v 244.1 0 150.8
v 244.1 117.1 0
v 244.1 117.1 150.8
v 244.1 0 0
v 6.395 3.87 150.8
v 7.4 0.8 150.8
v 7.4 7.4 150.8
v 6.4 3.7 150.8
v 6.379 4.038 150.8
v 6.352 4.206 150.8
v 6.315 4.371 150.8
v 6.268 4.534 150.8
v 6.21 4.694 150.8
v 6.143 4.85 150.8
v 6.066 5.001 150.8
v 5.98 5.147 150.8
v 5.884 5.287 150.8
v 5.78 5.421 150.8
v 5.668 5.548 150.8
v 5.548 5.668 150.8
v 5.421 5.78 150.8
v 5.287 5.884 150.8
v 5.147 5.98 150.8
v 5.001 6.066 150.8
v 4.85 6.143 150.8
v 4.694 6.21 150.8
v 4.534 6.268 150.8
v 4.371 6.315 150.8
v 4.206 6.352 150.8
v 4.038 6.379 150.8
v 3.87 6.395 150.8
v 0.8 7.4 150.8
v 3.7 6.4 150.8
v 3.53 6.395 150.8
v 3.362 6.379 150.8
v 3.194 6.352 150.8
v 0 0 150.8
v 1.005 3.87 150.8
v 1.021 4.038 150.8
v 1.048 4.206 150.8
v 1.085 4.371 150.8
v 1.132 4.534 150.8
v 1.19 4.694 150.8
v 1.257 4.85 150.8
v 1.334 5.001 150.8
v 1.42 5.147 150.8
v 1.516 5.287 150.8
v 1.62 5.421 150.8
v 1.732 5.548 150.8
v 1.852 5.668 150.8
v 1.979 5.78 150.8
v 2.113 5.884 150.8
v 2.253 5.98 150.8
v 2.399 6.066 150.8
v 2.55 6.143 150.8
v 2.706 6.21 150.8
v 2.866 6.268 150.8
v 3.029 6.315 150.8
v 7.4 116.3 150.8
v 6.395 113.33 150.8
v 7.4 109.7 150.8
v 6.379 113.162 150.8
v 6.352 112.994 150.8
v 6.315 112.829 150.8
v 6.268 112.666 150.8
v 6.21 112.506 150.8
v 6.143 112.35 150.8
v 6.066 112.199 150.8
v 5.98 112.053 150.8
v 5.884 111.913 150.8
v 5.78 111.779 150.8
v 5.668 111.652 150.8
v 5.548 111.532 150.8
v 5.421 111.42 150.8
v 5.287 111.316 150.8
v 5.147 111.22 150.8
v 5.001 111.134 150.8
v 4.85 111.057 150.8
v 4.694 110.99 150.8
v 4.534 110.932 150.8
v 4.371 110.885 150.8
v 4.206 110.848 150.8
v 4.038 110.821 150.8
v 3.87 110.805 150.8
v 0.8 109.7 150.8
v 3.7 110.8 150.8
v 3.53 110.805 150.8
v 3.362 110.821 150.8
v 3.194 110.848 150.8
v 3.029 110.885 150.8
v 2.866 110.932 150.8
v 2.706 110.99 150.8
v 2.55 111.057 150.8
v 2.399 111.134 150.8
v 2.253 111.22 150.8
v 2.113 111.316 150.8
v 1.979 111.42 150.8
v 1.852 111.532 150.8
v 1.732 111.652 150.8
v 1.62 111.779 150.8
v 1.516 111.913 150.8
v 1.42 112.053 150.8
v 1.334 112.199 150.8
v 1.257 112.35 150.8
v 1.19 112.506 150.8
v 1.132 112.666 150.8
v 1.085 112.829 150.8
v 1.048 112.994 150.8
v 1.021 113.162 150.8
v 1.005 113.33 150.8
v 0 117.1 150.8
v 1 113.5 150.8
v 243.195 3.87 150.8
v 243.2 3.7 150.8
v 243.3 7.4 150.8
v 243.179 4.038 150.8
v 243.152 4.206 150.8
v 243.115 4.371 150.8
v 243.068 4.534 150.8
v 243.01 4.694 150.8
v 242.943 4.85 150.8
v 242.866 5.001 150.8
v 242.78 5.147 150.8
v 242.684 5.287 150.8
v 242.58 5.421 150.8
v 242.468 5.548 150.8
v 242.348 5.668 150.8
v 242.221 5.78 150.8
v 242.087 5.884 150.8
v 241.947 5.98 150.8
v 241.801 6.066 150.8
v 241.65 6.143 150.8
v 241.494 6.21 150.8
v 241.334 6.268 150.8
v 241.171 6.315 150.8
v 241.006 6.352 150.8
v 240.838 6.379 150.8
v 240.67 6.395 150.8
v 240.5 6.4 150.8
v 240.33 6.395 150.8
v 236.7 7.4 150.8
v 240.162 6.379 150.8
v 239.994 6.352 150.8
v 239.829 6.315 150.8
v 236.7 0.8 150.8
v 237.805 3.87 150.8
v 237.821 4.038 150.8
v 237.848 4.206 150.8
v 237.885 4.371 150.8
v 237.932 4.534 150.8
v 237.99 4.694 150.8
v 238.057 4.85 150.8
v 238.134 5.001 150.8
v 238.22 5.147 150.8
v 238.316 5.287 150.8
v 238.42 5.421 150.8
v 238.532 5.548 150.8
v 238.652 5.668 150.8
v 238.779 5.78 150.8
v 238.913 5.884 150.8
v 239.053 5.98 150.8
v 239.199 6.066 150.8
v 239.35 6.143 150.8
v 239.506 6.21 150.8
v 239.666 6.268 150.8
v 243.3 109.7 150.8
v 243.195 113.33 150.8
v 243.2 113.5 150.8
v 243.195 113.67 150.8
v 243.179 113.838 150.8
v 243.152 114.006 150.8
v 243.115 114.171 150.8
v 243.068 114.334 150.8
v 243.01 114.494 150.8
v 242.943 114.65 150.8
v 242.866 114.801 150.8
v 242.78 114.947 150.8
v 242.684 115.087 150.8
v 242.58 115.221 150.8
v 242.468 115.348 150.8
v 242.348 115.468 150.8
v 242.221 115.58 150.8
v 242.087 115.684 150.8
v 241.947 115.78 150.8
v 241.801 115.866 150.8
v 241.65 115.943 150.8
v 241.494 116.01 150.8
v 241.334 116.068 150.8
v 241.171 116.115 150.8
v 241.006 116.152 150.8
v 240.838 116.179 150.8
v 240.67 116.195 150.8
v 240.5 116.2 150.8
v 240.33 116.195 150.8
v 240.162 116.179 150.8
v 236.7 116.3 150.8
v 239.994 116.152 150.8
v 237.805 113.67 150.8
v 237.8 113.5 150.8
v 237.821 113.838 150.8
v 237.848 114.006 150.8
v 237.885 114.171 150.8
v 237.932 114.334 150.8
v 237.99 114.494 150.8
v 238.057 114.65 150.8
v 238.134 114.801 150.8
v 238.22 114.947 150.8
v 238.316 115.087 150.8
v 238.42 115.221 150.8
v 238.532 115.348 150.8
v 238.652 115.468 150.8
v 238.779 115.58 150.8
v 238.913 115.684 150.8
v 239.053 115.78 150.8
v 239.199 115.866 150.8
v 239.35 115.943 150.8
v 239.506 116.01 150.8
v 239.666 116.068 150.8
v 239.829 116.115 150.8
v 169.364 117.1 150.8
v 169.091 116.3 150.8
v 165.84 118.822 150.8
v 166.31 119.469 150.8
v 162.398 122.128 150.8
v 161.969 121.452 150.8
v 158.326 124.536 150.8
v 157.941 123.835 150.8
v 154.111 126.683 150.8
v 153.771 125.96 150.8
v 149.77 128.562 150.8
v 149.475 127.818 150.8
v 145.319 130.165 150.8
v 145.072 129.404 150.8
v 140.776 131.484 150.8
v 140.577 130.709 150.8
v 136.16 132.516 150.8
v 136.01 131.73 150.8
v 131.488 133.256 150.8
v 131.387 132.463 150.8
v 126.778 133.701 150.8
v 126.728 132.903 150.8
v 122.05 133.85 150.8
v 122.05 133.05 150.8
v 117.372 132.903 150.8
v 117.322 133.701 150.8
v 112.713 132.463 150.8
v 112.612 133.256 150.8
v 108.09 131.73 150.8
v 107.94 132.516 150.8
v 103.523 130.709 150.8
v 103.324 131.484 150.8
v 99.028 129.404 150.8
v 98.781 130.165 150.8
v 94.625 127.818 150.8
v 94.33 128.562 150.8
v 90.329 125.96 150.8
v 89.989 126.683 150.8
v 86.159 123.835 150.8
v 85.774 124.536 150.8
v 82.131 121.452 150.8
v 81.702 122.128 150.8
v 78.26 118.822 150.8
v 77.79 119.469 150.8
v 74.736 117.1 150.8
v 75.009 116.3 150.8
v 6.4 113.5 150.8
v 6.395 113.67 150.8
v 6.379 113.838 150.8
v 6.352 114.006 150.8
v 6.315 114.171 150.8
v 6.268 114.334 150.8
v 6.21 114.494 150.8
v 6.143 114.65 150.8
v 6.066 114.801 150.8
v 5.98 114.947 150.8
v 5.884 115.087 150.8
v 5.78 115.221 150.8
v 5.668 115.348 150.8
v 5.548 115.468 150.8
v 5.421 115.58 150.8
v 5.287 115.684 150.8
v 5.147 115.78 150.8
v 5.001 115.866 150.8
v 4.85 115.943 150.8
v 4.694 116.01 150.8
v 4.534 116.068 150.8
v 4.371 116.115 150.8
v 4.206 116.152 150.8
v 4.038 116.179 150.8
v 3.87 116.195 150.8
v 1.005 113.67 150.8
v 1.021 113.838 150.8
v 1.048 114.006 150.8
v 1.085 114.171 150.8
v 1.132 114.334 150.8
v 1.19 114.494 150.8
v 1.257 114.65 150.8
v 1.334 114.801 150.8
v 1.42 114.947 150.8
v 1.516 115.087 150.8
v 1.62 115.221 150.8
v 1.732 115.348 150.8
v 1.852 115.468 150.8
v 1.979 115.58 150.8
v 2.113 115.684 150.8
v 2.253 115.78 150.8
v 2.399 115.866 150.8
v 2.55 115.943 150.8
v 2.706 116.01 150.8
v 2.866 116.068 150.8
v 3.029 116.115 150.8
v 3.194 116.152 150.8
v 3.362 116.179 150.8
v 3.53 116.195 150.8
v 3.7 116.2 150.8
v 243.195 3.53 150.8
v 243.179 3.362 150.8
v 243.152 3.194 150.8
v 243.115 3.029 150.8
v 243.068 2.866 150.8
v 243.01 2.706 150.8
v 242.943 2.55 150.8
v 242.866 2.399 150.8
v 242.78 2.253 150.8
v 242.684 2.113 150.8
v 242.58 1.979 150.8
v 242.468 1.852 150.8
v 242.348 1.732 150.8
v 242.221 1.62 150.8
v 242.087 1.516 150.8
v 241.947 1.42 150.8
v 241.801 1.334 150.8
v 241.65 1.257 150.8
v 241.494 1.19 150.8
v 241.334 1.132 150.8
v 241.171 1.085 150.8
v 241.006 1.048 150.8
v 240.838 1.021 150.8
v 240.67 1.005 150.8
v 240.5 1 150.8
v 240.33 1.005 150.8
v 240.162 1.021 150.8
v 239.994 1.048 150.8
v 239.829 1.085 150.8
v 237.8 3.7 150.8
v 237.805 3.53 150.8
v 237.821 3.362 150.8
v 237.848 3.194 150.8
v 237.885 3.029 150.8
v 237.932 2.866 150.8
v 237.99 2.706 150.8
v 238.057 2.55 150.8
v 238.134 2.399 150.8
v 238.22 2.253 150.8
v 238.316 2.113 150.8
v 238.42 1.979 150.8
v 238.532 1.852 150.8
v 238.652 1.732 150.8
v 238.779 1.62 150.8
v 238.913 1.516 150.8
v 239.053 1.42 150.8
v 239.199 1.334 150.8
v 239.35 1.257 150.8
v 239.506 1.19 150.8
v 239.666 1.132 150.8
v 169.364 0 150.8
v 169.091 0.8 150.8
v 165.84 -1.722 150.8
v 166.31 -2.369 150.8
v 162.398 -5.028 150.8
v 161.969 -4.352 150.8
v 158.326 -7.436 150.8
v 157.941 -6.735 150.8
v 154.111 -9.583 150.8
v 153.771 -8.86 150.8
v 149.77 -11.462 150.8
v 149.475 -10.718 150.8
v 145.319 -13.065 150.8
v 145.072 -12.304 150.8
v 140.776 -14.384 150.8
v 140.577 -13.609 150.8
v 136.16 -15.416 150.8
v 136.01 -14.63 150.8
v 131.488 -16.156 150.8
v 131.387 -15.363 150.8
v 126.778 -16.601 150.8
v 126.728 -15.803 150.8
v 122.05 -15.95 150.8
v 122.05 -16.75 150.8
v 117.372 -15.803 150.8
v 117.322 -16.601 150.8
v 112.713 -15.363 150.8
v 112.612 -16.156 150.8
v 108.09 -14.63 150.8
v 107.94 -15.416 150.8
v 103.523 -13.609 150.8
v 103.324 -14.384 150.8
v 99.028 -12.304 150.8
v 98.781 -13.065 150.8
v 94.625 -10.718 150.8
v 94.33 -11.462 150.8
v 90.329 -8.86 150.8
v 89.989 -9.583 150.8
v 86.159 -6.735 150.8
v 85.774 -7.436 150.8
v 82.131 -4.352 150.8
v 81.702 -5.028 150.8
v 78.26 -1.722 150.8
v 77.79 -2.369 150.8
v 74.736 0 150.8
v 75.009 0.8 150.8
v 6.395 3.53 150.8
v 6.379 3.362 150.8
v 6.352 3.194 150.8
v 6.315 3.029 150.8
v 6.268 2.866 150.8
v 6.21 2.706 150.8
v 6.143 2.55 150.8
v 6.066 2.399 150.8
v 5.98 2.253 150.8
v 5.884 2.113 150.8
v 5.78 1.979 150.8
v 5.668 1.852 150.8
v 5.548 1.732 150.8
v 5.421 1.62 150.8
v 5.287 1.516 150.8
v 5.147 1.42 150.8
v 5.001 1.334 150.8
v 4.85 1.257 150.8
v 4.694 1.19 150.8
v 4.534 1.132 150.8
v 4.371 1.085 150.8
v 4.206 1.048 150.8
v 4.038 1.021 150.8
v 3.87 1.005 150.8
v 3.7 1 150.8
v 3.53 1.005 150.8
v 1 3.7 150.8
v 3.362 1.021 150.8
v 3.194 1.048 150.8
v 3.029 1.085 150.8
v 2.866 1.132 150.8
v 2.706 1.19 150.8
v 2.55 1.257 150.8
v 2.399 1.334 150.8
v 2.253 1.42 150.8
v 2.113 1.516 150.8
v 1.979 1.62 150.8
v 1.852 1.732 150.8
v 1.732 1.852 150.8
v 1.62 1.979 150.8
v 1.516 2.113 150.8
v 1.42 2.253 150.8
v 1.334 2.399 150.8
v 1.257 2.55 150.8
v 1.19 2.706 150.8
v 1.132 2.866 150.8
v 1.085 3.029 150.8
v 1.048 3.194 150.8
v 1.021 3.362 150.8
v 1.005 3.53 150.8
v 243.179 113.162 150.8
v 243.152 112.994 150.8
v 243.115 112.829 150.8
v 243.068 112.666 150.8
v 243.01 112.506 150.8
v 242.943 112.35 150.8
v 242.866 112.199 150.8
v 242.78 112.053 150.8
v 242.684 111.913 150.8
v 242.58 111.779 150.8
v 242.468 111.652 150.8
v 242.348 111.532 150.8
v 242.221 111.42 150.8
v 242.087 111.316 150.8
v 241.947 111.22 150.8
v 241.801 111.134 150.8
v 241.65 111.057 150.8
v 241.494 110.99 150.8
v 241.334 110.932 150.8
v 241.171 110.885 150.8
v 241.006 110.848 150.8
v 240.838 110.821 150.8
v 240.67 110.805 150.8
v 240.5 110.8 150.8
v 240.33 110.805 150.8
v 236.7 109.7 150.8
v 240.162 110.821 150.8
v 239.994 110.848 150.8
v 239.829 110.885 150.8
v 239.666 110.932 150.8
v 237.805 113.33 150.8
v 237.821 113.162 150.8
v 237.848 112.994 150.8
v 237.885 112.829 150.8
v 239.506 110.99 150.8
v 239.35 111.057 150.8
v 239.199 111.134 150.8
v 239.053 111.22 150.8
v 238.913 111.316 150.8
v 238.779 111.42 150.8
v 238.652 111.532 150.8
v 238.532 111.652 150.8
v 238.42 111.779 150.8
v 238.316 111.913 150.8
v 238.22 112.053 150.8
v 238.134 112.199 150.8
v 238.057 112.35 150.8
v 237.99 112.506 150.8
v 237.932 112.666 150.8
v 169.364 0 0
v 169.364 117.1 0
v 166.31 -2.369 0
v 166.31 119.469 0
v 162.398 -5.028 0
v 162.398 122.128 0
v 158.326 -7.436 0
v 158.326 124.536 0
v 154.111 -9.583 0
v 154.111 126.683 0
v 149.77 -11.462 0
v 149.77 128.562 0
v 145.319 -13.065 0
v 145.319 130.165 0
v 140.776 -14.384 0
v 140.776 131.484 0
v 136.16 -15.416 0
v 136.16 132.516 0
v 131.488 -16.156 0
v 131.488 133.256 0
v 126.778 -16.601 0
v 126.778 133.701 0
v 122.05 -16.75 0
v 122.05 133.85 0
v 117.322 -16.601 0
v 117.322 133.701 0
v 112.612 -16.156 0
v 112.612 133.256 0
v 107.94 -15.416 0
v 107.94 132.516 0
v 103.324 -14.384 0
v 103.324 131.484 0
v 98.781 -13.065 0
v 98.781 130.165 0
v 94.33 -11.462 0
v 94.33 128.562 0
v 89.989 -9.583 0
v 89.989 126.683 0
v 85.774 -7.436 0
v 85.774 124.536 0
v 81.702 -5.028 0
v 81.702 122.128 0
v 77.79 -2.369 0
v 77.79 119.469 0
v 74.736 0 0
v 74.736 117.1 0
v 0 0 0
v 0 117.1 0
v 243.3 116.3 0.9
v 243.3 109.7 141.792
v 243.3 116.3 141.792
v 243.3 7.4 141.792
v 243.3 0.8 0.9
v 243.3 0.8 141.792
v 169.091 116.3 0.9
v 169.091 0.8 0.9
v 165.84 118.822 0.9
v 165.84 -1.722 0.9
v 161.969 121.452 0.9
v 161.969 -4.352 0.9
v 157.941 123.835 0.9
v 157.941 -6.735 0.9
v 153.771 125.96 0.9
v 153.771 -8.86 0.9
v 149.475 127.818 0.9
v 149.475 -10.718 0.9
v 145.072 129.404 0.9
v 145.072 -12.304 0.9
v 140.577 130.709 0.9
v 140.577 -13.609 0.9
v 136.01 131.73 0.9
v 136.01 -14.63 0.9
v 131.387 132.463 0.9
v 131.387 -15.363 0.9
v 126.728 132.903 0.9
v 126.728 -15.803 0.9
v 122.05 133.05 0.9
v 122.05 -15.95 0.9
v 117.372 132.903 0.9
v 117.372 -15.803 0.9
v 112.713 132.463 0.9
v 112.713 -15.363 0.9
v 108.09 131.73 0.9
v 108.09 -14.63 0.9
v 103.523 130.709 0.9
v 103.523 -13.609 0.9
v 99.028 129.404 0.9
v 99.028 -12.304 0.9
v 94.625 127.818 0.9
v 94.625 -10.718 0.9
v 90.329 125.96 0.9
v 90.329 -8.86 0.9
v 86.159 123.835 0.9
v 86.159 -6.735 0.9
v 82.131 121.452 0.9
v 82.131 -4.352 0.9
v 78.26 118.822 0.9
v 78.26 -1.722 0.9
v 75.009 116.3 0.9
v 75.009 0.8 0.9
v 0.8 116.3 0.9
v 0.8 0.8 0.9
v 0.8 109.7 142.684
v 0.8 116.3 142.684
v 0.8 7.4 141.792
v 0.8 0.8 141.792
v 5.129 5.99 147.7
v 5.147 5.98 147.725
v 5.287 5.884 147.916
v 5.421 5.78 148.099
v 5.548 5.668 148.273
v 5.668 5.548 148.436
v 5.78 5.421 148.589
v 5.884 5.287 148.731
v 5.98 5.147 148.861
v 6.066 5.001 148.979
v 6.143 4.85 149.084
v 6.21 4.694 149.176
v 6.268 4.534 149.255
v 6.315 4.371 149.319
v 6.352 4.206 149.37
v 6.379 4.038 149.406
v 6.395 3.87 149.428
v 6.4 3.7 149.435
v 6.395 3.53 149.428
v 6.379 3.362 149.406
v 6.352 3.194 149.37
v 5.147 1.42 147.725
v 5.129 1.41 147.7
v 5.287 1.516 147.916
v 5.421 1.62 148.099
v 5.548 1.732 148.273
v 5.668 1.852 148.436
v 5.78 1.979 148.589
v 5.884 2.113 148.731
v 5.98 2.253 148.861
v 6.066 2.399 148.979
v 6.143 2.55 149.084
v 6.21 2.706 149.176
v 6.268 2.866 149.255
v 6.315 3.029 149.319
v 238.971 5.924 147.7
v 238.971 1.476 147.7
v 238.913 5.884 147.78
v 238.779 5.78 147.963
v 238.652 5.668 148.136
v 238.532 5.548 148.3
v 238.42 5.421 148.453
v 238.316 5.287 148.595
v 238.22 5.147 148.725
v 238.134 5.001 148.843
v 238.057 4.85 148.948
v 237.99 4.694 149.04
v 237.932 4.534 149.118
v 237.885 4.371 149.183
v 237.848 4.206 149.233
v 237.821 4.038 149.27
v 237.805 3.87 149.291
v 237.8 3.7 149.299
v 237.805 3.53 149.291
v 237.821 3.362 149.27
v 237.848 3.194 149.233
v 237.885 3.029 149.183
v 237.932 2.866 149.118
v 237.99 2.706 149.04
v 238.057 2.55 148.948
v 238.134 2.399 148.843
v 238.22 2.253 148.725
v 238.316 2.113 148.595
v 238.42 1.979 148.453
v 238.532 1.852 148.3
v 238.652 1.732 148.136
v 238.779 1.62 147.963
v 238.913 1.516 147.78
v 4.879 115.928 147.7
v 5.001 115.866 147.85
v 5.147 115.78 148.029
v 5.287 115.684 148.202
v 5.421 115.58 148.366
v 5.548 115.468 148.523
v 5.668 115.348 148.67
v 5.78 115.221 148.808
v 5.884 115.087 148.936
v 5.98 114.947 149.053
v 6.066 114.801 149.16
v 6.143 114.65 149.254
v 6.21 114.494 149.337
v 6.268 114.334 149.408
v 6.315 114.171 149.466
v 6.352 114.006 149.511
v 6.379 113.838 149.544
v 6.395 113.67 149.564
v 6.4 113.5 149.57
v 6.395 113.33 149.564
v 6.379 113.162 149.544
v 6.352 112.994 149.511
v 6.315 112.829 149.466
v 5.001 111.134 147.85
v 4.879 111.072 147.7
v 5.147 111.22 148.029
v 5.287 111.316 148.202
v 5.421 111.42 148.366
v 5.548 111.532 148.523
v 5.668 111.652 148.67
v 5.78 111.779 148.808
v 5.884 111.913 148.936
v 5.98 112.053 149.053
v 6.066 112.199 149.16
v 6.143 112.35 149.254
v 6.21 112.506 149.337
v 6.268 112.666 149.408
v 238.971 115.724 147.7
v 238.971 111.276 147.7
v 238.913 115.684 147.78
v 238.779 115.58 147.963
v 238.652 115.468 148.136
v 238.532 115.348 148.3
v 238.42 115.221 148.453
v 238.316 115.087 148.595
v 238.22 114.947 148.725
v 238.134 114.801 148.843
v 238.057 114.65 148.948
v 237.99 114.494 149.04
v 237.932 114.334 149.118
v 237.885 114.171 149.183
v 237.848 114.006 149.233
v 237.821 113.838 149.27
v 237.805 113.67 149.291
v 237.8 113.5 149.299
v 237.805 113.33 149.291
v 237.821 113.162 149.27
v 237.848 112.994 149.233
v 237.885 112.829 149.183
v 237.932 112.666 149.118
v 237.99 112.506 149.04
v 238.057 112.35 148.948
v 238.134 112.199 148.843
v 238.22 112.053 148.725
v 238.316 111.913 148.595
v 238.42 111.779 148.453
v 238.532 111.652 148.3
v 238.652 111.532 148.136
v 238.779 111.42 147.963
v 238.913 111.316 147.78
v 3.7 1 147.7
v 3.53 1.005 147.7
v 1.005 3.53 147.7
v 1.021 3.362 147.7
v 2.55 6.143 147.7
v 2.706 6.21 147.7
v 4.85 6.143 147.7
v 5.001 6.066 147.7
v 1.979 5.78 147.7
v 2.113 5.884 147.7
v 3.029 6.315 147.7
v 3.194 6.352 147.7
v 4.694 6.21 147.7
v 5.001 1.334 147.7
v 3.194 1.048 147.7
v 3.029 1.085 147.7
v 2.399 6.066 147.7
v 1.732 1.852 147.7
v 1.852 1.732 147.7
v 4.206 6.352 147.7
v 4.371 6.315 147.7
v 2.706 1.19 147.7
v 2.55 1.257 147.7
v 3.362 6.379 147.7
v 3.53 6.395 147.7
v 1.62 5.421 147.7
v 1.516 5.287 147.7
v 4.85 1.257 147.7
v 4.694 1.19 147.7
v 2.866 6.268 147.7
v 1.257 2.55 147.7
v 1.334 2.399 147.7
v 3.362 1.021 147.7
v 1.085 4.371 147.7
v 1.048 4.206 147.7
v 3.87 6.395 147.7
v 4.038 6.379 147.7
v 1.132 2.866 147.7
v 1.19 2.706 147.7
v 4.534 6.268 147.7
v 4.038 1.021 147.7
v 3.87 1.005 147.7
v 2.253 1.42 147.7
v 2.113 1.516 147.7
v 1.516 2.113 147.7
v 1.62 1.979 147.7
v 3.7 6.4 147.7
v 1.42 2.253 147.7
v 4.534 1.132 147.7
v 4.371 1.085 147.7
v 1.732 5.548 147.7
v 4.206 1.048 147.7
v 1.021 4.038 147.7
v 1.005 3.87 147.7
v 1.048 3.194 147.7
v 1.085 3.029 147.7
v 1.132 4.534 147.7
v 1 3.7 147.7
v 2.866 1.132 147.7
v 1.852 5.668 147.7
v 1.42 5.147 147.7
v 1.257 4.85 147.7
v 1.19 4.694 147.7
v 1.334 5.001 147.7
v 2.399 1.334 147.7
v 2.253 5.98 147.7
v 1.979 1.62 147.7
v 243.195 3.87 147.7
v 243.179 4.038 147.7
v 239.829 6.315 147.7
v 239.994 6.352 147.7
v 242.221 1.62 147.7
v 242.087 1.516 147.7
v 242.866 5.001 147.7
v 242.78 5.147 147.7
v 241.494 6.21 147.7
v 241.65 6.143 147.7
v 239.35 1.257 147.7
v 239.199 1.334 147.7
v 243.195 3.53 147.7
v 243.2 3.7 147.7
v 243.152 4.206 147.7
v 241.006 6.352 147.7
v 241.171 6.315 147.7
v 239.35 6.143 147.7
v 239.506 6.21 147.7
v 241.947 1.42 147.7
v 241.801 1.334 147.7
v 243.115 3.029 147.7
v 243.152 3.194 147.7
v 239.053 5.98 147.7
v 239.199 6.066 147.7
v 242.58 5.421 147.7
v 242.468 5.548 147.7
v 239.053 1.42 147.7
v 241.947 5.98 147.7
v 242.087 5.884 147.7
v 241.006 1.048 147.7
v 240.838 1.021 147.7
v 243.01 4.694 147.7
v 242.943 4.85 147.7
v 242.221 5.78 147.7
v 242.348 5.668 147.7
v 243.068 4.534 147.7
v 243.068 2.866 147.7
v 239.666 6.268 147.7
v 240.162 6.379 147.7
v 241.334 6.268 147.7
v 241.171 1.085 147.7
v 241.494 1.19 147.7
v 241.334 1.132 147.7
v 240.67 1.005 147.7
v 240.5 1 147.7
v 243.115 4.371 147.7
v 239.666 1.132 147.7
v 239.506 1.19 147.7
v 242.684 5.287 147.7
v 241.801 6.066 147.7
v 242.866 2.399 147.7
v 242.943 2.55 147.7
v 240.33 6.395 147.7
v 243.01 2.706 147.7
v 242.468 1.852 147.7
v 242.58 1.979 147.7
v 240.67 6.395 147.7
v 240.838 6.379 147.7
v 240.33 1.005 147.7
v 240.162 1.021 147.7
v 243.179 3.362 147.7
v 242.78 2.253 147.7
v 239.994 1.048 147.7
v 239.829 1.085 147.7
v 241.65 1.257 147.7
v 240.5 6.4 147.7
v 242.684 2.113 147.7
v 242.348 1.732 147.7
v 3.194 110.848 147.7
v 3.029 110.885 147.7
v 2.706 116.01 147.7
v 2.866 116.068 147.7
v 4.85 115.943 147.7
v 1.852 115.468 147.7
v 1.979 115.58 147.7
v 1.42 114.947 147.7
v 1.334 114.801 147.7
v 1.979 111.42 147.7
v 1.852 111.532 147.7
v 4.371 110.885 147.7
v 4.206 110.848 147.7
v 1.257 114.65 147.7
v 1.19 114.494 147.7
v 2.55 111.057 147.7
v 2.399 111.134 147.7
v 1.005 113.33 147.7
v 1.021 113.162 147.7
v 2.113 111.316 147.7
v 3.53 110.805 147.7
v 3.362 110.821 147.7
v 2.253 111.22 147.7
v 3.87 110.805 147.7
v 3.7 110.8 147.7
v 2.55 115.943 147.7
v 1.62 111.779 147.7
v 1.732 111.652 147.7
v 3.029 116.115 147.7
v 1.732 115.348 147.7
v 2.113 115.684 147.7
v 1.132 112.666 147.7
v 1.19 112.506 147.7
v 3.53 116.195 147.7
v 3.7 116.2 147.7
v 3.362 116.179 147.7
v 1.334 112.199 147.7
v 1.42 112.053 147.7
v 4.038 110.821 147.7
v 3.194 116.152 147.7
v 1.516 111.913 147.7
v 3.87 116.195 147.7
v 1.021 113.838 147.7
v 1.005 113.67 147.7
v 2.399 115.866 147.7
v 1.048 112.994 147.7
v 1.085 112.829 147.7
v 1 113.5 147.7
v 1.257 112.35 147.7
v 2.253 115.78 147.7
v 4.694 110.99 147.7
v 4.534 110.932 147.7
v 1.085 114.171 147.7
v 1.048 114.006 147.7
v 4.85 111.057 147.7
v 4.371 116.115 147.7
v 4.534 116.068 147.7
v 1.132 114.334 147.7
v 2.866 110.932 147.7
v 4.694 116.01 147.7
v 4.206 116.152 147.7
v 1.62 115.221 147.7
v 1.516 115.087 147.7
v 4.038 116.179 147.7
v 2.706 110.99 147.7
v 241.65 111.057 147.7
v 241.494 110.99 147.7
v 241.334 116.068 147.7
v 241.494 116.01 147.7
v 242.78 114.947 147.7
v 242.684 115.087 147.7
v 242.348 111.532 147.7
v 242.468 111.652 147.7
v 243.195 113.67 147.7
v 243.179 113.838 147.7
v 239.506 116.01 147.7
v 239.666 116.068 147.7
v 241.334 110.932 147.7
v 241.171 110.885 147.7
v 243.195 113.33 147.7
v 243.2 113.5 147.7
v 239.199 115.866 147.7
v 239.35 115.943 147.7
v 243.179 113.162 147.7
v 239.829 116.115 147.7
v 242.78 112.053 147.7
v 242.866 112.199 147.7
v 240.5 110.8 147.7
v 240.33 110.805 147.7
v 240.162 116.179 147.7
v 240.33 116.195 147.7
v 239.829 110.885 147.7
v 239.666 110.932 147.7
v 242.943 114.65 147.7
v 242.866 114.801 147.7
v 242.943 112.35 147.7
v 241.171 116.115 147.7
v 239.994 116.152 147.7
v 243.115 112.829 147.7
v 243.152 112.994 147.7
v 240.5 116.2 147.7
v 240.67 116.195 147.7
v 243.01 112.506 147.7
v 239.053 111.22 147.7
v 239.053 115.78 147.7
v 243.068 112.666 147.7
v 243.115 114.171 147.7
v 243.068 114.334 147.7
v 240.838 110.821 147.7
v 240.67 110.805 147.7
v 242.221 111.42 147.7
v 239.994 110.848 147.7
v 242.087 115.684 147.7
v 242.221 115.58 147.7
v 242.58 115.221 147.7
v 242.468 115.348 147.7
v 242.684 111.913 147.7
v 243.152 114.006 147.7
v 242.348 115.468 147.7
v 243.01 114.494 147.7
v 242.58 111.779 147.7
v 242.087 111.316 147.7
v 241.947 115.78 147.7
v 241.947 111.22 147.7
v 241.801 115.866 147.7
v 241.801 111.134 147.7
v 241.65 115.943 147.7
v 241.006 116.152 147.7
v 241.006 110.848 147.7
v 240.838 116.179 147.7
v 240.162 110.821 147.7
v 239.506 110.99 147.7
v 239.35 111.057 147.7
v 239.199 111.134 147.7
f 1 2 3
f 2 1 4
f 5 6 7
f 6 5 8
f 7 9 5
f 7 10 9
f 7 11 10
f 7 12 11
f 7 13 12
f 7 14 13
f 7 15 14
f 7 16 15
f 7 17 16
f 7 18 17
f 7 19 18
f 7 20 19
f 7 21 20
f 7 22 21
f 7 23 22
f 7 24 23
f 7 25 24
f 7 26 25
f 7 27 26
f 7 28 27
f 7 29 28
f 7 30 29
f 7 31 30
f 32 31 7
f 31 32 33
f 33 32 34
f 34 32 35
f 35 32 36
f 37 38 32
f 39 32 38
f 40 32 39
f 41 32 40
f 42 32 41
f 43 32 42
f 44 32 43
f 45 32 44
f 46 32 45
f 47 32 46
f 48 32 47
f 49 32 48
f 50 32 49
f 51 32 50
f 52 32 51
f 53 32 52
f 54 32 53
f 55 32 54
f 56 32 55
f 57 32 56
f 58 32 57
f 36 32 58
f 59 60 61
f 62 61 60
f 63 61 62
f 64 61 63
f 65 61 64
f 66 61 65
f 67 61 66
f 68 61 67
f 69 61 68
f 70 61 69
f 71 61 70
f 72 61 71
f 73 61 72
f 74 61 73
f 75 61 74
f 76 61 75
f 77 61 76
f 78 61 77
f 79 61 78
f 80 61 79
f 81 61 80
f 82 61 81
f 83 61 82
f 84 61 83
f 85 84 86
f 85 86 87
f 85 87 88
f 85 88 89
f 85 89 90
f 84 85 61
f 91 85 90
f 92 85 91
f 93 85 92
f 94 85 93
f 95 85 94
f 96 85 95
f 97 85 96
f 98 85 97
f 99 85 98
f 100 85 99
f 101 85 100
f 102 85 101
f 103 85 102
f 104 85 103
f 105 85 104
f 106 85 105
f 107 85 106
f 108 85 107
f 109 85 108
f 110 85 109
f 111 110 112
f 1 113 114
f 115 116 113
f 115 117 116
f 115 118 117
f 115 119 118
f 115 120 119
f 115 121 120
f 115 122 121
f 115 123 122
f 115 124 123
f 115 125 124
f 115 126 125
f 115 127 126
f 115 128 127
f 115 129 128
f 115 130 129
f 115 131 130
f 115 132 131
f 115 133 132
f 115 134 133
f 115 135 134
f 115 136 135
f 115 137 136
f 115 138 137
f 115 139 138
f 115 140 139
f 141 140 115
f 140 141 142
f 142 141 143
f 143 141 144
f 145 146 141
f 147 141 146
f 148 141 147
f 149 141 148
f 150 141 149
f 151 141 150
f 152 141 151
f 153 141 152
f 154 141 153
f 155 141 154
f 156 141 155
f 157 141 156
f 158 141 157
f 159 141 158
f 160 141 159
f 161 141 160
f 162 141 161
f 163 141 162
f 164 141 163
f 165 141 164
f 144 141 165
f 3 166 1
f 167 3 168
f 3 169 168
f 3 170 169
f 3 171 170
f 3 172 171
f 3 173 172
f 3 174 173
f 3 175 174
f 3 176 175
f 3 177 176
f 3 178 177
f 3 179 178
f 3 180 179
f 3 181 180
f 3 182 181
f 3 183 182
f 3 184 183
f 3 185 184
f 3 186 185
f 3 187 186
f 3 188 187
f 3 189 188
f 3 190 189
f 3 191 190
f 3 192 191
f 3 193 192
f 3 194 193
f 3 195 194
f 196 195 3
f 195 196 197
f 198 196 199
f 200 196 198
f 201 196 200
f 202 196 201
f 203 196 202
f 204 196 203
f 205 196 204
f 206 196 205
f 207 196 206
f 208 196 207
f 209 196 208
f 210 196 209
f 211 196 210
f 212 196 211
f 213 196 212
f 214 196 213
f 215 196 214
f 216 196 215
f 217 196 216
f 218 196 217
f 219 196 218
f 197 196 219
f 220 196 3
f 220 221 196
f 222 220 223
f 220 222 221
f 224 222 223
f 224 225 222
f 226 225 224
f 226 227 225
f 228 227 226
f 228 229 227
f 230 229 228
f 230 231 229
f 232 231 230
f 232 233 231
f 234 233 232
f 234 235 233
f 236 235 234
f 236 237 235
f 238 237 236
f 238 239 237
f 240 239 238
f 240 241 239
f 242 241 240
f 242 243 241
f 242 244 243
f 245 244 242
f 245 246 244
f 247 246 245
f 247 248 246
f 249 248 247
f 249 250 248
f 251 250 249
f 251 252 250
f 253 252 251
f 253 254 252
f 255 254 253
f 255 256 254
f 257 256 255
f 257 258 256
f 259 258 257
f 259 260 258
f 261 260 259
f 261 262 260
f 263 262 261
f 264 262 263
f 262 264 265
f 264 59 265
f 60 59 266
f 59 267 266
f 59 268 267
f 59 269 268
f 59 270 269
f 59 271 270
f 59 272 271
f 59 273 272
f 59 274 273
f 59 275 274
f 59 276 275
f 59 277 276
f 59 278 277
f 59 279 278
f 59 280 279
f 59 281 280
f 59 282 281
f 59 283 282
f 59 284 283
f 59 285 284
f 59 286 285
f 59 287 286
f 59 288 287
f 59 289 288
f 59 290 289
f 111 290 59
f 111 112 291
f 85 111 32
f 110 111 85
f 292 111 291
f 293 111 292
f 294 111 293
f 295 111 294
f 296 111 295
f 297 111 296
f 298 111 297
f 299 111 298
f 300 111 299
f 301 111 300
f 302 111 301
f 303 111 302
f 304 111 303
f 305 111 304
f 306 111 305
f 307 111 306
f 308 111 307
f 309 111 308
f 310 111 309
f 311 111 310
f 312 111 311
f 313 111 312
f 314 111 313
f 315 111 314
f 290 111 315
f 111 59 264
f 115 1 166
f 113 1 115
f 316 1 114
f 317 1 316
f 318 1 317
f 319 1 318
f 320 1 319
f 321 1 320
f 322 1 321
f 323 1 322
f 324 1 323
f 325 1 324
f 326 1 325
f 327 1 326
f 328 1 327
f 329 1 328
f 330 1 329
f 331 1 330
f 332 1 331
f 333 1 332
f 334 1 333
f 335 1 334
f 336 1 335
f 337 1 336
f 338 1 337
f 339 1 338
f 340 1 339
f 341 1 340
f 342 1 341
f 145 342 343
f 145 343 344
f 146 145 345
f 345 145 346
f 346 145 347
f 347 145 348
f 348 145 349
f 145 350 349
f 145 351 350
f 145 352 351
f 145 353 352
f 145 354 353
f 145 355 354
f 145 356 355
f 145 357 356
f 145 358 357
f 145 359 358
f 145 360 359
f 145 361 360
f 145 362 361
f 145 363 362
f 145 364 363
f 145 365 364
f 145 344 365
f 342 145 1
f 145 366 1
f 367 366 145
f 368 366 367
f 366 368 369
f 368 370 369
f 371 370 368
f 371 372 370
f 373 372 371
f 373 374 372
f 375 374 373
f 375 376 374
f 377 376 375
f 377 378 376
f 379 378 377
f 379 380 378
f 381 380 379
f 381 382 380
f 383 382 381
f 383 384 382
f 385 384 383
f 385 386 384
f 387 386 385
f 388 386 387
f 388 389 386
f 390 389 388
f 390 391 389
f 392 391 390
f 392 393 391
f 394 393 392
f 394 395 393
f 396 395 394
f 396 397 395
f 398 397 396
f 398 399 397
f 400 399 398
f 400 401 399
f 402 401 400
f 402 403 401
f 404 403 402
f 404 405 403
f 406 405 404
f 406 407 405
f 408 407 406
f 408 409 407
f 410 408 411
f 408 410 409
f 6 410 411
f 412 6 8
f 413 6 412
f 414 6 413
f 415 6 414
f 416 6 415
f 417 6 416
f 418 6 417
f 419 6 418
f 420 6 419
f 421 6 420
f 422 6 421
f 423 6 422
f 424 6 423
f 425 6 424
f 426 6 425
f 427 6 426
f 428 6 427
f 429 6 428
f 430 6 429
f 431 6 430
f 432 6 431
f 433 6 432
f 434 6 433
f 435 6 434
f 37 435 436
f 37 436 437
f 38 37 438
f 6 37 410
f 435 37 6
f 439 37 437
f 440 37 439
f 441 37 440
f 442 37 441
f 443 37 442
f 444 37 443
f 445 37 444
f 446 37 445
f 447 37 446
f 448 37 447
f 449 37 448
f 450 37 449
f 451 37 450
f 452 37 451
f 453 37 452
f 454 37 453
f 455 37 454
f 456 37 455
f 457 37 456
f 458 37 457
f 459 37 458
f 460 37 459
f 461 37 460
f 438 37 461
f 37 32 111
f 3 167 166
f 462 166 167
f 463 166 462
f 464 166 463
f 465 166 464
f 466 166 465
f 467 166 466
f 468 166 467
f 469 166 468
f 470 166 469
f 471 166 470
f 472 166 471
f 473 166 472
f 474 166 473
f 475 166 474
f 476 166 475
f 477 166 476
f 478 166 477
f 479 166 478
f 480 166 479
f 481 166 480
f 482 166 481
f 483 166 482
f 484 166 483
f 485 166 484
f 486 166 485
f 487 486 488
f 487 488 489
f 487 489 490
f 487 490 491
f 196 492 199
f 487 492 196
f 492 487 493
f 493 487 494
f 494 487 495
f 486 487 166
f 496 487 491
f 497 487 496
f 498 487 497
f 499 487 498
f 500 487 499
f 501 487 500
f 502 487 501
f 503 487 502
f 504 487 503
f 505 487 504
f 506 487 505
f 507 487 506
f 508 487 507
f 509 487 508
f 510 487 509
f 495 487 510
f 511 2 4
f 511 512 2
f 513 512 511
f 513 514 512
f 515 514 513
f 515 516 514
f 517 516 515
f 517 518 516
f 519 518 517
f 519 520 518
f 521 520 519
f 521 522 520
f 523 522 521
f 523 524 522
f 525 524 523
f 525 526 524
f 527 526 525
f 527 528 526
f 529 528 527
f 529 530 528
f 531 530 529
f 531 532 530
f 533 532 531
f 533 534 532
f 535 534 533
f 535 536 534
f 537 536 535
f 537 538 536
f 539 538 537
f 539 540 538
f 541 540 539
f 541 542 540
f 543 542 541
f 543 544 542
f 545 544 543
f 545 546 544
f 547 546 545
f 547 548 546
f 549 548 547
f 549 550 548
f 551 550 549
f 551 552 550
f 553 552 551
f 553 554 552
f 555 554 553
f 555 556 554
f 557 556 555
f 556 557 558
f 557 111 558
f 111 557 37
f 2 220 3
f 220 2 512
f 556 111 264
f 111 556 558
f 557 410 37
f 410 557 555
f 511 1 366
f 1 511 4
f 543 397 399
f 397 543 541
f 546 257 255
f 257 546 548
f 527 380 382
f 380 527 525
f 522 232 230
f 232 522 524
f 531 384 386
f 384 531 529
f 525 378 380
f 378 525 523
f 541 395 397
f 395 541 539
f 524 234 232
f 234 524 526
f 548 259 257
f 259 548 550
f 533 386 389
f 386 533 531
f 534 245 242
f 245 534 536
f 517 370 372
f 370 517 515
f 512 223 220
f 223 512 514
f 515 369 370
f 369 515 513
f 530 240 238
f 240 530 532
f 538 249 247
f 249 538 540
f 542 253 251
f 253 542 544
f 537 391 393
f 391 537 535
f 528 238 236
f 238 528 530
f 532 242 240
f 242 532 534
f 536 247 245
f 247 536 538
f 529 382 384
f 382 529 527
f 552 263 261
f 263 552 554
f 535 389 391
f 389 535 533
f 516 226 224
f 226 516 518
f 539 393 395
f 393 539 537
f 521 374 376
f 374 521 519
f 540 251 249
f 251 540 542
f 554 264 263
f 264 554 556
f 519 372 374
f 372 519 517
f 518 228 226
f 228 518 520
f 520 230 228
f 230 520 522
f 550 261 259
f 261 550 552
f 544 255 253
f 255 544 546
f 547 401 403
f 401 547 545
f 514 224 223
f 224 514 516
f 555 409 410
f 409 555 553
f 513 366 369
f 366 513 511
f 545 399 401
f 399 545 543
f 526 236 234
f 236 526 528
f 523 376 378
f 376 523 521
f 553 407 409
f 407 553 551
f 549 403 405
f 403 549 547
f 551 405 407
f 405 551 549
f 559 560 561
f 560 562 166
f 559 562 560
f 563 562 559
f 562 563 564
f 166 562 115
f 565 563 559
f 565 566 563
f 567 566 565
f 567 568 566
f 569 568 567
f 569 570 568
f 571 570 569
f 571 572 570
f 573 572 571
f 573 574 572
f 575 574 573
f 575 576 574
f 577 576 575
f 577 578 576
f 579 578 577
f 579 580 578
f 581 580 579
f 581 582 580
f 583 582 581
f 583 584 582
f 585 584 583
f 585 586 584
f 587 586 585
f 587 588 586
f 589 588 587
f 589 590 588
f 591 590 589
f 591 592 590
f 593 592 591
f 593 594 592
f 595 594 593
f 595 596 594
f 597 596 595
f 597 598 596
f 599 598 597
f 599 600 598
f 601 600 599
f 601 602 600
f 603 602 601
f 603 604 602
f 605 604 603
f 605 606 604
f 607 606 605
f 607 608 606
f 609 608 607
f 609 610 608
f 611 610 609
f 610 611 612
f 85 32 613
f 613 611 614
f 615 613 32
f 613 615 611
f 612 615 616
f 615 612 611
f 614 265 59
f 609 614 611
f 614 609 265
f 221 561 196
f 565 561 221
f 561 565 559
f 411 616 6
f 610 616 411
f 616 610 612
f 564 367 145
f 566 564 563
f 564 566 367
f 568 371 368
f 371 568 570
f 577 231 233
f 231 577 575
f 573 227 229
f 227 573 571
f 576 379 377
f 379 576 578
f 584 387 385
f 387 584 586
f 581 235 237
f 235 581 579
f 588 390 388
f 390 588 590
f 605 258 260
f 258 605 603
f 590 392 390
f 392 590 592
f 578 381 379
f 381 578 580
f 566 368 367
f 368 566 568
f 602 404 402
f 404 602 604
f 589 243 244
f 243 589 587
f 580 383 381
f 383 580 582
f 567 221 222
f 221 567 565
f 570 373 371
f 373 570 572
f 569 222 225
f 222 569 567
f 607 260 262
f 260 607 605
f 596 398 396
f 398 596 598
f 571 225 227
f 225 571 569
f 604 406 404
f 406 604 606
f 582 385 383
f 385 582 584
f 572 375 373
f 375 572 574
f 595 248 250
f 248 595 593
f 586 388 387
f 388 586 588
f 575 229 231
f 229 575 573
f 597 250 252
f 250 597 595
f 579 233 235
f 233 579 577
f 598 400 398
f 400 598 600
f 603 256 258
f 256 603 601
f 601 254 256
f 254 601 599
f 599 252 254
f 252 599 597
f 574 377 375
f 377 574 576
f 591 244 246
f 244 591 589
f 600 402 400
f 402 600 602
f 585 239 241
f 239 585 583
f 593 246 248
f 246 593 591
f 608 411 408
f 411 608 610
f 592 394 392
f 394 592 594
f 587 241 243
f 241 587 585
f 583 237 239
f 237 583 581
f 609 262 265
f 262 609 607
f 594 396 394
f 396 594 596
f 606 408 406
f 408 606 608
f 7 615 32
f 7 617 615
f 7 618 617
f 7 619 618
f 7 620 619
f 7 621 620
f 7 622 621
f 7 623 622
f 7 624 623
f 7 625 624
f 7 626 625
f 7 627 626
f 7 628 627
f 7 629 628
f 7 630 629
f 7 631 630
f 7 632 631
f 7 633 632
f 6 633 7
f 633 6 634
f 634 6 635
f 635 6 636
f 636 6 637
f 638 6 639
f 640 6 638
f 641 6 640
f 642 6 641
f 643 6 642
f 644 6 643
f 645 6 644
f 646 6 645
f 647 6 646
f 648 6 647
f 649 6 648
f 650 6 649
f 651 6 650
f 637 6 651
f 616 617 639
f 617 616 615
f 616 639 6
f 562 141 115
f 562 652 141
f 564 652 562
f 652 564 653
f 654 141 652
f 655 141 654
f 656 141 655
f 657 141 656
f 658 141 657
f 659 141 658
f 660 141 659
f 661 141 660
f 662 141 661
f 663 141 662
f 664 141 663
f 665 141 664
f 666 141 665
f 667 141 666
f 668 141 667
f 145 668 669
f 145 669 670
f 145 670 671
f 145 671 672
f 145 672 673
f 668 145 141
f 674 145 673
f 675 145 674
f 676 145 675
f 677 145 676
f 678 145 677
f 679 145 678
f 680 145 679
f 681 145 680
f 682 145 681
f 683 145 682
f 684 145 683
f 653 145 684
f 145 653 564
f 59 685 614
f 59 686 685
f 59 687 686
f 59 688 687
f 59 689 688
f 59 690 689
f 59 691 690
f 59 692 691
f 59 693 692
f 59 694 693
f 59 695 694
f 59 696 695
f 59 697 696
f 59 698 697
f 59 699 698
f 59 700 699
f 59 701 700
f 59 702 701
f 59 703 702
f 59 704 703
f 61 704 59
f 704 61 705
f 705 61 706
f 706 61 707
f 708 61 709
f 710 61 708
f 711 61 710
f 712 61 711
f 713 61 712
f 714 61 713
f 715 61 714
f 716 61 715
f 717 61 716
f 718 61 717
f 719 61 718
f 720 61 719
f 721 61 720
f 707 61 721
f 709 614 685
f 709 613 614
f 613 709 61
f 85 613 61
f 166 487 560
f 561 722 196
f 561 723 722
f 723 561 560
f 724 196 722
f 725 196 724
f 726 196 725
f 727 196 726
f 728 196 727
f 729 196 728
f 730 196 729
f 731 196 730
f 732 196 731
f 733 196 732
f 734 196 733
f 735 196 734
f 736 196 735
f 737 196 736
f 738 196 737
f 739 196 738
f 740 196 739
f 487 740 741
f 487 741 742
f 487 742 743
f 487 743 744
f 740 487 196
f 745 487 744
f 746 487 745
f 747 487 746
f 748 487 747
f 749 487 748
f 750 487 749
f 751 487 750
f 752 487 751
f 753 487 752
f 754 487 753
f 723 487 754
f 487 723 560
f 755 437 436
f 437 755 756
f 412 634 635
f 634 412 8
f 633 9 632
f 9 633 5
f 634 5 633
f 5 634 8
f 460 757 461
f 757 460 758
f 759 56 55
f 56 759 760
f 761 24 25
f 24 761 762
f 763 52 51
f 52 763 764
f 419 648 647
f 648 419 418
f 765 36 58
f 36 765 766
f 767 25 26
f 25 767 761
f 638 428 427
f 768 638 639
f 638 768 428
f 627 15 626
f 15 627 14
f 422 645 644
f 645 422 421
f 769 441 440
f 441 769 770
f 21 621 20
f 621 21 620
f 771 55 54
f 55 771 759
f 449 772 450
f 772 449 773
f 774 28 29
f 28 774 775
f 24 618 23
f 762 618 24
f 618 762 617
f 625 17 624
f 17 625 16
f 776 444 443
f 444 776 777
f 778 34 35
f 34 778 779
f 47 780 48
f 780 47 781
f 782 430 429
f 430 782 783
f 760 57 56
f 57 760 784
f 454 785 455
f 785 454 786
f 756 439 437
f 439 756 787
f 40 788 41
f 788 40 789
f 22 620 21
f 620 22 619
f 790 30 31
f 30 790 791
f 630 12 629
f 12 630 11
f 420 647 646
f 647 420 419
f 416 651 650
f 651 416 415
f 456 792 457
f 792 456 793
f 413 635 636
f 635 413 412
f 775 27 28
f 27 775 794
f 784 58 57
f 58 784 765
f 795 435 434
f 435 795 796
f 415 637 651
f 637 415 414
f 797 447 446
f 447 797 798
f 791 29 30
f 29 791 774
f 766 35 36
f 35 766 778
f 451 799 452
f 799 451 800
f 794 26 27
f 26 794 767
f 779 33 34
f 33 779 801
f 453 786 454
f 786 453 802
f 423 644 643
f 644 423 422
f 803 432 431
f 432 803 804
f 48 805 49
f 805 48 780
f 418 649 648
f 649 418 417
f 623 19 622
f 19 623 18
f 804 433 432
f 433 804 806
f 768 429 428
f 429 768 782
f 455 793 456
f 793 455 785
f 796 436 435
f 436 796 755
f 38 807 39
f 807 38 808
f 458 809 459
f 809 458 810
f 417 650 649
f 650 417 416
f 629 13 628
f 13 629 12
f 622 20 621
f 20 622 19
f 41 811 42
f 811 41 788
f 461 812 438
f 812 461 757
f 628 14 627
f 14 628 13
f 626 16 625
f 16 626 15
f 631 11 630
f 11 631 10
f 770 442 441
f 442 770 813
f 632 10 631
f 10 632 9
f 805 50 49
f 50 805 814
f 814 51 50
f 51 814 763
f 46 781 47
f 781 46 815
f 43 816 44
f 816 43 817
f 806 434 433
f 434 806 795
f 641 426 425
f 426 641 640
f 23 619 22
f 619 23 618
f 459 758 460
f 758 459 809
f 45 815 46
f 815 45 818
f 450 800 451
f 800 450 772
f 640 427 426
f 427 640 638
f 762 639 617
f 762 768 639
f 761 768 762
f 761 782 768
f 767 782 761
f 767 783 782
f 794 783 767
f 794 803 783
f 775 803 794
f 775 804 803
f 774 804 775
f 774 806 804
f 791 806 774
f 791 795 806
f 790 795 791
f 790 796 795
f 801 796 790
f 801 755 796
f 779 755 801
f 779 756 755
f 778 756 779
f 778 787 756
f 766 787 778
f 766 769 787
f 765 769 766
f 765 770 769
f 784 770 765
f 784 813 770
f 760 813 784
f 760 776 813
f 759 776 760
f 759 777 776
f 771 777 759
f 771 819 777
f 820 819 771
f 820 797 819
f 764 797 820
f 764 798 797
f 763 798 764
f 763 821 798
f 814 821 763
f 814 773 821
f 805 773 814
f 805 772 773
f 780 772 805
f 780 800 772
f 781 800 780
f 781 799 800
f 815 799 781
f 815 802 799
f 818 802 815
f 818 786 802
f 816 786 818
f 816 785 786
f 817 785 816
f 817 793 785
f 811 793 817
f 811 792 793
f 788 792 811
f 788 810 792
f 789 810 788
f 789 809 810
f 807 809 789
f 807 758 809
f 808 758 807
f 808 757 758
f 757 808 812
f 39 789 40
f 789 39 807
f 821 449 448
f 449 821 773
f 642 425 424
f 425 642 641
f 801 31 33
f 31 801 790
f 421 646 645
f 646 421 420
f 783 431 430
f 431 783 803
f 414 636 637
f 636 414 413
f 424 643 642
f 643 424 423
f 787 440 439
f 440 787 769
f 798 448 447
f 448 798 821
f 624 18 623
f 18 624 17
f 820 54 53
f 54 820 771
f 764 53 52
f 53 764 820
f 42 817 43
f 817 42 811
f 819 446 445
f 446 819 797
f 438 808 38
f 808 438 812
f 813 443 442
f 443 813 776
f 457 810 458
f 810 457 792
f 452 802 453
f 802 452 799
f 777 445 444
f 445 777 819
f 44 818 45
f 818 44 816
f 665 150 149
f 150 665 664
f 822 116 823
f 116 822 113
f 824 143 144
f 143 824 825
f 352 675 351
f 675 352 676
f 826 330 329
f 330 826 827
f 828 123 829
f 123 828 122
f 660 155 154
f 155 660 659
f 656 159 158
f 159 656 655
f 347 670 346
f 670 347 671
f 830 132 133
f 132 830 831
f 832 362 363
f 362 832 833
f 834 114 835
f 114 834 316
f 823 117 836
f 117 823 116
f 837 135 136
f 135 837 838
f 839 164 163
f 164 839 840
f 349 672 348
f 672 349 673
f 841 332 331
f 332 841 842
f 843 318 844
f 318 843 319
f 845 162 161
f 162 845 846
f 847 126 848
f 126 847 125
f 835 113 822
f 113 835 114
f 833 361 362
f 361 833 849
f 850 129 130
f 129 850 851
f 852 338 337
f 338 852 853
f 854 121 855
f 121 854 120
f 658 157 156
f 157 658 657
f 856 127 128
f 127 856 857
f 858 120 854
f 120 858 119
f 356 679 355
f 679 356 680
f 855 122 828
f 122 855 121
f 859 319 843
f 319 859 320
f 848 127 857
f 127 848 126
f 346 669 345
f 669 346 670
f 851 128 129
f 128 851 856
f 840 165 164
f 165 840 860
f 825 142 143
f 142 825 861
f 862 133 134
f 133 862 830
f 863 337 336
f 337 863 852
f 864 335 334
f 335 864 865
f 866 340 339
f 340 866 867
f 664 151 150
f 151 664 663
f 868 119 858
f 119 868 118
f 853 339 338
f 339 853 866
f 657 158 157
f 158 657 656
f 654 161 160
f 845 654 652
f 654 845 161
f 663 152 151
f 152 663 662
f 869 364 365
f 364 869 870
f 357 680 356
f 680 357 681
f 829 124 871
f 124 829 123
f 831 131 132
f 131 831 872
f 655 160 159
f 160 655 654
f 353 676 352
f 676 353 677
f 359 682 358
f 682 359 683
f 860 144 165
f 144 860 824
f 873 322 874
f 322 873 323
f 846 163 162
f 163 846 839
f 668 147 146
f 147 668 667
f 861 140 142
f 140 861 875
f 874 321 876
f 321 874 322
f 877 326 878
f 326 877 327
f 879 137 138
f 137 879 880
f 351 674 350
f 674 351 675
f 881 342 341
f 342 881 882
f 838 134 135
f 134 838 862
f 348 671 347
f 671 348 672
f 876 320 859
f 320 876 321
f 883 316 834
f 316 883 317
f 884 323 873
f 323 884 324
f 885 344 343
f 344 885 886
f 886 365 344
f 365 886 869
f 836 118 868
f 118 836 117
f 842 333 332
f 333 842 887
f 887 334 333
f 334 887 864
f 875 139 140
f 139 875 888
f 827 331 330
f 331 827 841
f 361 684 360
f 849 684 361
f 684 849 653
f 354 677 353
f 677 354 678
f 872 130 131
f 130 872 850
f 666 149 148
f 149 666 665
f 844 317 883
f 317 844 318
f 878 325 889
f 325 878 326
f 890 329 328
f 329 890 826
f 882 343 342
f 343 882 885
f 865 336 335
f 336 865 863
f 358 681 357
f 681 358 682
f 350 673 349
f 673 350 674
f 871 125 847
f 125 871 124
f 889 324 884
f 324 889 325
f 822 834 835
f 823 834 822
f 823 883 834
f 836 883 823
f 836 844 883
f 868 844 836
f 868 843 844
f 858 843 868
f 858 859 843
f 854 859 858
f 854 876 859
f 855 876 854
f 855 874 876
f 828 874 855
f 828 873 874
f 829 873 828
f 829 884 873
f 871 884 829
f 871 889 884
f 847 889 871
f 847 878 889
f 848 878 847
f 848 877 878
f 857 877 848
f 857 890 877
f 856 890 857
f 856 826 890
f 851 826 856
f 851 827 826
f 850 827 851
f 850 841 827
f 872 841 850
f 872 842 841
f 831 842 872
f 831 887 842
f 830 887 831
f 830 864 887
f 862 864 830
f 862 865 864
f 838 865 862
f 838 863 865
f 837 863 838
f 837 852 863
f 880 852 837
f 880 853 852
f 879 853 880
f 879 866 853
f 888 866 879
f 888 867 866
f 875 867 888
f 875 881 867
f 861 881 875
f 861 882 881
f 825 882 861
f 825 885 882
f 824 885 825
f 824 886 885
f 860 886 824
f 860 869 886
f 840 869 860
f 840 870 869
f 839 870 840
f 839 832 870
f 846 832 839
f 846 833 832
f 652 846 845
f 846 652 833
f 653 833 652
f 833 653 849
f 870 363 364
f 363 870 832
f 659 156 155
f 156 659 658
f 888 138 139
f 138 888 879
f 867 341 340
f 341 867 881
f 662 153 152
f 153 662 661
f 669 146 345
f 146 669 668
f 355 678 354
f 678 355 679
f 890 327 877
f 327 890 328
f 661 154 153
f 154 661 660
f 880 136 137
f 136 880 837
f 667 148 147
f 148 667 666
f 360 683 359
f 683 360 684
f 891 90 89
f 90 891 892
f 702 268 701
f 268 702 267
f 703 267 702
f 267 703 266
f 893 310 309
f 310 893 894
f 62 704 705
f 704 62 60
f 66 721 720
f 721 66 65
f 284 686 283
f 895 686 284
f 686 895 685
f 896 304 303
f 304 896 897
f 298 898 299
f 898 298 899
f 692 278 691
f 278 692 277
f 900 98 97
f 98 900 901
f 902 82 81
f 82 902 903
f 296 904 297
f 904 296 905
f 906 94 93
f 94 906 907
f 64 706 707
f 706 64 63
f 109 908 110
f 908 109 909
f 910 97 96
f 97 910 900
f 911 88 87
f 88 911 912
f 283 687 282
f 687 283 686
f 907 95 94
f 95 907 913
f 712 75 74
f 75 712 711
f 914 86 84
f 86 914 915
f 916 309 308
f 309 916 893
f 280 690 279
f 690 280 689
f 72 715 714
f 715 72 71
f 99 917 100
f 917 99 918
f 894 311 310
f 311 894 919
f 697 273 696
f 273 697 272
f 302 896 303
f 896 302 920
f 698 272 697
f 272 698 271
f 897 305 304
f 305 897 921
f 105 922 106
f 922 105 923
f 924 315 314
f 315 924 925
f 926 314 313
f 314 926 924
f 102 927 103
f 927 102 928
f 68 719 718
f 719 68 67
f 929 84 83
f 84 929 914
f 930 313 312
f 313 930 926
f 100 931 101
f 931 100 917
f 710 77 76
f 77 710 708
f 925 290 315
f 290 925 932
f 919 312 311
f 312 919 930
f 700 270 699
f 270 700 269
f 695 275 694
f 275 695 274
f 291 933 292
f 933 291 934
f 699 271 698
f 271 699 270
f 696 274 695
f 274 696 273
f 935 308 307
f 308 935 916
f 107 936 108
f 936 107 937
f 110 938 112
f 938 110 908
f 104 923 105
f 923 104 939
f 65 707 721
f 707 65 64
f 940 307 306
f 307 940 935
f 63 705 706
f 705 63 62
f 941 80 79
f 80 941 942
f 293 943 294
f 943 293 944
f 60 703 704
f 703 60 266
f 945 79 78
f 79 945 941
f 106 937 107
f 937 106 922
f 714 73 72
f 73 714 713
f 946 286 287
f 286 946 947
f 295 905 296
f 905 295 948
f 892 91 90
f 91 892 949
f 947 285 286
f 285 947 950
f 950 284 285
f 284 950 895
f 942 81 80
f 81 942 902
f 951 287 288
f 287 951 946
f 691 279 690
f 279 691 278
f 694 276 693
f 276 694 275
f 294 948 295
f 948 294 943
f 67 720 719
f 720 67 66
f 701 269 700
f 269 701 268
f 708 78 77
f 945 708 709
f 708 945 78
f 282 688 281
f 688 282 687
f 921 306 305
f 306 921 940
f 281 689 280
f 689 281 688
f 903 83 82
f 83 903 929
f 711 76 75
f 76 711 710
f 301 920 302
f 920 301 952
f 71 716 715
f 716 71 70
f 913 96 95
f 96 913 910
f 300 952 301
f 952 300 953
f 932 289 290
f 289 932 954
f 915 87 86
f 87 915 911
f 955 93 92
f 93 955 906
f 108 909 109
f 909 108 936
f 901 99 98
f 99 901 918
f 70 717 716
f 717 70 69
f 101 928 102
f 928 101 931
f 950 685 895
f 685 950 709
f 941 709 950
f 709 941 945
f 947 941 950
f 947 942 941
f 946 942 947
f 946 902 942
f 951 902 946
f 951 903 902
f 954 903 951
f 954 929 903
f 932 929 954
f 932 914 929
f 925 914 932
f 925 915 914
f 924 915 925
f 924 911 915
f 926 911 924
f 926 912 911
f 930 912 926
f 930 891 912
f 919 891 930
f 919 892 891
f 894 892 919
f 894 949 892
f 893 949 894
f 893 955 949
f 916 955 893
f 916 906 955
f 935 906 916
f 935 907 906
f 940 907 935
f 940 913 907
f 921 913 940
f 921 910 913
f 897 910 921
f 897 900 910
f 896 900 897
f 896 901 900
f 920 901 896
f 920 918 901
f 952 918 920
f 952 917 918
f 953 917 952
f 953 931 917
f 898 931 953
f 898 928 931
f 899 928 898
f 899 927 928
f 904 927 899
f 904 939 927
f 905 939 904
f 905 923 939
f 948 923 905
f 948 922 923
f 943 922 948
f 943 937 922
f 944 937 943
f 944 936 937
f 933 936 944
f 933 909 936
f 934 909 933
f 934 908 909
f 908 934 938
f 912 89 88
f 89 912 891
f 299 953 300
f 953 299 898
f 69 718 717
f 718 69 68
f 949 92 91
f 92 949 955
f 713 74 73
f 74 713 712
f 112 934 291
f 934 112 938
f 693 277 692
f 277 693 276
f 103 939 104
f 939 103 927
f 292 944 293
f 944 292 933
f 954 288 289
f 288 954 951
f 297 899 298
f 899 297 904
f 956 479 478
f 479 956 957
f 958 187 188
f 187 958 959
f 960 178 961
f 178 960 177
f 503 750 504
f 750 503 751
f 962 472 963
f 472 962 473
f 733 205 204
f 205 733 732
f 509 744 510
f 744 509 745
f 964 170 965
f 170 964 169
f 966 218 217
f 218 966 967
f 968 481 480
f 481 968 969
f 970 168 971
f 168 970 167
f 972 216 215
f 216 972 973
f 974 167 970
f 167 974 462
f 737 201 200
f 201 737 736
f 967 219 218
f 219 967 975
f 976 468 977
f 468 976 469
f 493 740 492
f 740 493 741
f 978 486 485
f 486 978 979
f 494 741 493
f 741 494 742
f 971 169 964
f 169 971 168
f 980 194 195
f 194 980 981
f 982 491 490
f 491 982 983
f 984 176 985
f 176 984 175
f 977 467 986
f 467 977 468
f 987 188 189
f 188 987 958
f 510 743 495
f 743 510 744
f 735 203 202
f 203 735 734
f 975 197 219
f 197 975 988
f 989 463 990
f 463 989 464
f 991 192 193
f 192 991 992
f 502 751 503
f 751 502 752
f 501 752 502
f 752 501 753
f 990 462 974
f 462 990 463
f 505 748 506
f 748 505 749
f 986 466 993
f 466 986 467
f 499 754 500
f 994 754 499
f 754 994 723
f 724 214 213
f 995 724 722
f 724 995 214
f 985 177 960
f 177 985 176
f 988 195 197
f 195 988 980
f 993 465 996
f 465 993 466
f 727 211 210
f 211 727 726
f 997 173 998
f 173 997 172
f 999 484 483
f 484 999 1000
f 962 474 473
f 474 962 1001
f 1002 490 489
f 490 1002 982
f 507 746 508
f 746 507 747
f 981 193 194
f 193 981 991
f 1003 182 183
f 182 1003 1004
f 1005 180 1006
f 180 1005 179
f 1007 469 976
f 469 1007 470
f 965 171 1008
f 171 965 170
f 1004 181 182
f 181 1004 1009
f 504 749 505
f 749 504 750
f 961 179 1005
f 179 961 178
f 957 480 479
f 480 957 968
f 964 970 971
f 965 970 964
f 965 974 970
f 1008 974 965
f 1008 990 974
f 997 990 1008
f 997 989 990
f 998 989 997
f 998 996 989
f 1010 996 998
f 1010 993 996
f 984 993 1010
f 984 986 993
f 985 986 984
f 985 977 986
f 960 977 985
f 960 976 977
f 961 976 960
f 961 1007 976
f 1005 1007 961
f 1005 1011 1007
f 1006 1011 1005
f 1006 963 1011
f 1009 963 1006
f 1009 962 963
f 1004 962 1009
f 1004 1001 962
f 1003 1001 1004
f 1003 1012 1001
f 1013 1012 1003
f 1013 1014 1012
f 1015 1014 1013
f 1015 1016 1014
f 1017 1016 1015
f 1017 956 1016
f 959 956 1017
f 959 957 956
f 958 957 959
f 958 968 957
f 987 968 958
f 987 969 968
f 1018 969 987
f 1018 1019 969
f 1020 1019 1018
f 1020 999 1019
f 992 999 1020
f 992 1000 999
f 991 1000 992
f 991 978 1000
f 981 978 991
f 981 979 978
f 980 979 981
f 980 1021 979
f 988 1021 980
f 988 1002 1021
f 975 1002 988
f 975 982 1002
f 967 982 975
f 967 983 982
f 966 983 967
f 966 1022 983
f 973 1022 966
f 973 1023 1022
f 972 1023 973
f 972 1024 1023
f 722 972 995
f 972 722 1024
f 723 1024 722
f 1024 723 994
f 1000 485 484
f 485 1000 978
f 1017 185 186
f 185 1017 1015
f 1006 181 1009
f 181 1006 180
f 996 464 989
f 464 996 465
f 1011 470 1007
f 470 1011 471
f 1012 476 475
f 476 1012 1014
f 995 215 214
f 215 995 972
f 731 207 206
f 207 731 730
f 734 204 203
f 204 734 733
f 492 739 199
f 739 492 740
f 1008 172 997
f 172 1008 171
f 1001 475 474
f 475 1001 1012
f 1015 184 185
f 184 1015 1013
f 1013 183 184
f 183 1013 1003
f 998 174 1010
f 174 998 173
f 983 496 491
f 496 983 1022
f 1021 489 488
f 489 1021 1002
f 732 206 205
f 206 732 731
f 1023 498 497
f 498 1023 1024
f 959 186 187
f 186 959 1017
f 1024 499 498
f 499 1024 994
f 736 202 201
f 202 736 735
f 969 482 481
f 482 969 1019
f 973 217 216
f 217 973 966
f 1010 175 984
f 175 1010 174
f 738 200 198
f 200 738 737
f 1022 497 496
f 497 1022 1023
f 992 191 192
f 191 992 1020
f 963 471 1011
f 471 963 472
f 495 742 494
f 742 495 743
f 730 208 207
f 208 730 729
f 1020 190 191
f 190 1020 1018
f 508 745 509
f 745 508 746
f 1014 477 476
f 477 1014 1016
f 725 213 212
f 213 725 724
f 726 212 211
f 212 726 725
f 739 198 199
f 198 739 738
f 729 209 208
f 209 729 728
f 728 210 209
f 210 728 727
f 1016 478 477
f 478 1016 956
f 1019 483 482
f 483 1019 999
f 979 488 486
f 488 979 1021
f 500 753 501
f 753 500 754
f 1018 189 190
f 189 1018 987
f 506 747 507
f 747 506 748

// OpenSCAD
padding=2.5;
inner_width=113 + padding;
inner_length=240 + padding;
inner_radius=144/2  + padding;
height=150;
wall_thickness=.8;
$fn=100;
magnet_r=2.7;
magnet_d=3.2;



difference(){
    union(){
        difference(){
           union(){
                cube([inner_length+(2*wall_thickness)
                        , inner_width+(2*wall_thickness)
                        , height+wall_thickness]);
                translate([wall_thickness+ inner_length/2,wall_thickness + inner_width/2,0])
                cylinder(r1=inner_radius+wall_thickness, r2=inner_radius+wall_thickness, h=height+wall_thickness);
            }
            translate([wall_thickness,wall_thickness,wall_thickness+.1])
            union(){
                cube([inner_length, inner_width,height]);
                translate([inner_length/2,inner_width/2,0])
                cylinder(r1=inner_radius, r2=inner_radius, h=height+wall_thickness);
            }
        }

            translate([0,magnet_r*2+2,height+wall_thickness]){
                rotate([0,90,-90])
                color("red")
                triangle(magnet_r*2+2,magnet_r*3+2,magnet_r*2+2);
            }
            
            translate([inner_length-(2*wall_thickness)+(magnet_r*2-2.2)
            ,0
            ,height+wall_thickness]){
                rotate([0,90,90])
                color("red")
                triangle(magnet_r*2+2,magnet_r*3+2,magnet_r*2+2);
            }
            
           translate([0
            ,inner_width-(2*wall_thickness)+(magnet_r*2-2.2)
            ,height+wall_thickness]){
                rotate([0,90,-90])
                color("red")
                triangle(magnet_r*2+2,magnet_r*3+1,magnet_r*2+2);
            }
            
            translate([inner_length-(2*wall_thickness)+(magnet_r*2-2.2)
            ,inner_width+(2*wall_thickness)-(magnet_r*2+2)
            ,height+wall_thickness]){
                rotate([0,90,90])
                color("red")
                triangle(magnet_r*2+2,magnet_r*3+2,magnet_r*2+2);
            }
        }

    translate([magnet_r+1,magnet_r+1,height+wall_thickness-magnet_d+.1]){
        cylinder(r1=magnet_r,r2=magnet_r,h=magnet_d);
    }

    translate([inner_length-2,magnet_r+1,height+wall_thickness-magnet_d+.1]){
        cylinder(r1=magnet_r,r2=magnet_r,h=magnet_d);
    }

    translate([magnet_r+1,inner_width-2,height+wall_thickness-magnet_d+.1]){
        cylinder(r1=magnet_r,r2=magnet_r,h=magnet_d);
    }

    translate([inner_length-2,inner_width-2,height+wall_thickness-magnet_d+.1]){
        cylinder(r1=magnet_r,r2=magnet_r,h=magnet_d);
    }
}

module triangle(o_len, a_len, depth, center=false)
{
    centroid = center ? [-a_len/3, -o_len/3, -depth/2] : [0, 0, 0];
    translate(centroid) linear_extrude(height=depth)
    {
        polygon(points=[[0,0],[a_len,0],[0,o_len]], paths=[[0,1,2]]);
    }
}
